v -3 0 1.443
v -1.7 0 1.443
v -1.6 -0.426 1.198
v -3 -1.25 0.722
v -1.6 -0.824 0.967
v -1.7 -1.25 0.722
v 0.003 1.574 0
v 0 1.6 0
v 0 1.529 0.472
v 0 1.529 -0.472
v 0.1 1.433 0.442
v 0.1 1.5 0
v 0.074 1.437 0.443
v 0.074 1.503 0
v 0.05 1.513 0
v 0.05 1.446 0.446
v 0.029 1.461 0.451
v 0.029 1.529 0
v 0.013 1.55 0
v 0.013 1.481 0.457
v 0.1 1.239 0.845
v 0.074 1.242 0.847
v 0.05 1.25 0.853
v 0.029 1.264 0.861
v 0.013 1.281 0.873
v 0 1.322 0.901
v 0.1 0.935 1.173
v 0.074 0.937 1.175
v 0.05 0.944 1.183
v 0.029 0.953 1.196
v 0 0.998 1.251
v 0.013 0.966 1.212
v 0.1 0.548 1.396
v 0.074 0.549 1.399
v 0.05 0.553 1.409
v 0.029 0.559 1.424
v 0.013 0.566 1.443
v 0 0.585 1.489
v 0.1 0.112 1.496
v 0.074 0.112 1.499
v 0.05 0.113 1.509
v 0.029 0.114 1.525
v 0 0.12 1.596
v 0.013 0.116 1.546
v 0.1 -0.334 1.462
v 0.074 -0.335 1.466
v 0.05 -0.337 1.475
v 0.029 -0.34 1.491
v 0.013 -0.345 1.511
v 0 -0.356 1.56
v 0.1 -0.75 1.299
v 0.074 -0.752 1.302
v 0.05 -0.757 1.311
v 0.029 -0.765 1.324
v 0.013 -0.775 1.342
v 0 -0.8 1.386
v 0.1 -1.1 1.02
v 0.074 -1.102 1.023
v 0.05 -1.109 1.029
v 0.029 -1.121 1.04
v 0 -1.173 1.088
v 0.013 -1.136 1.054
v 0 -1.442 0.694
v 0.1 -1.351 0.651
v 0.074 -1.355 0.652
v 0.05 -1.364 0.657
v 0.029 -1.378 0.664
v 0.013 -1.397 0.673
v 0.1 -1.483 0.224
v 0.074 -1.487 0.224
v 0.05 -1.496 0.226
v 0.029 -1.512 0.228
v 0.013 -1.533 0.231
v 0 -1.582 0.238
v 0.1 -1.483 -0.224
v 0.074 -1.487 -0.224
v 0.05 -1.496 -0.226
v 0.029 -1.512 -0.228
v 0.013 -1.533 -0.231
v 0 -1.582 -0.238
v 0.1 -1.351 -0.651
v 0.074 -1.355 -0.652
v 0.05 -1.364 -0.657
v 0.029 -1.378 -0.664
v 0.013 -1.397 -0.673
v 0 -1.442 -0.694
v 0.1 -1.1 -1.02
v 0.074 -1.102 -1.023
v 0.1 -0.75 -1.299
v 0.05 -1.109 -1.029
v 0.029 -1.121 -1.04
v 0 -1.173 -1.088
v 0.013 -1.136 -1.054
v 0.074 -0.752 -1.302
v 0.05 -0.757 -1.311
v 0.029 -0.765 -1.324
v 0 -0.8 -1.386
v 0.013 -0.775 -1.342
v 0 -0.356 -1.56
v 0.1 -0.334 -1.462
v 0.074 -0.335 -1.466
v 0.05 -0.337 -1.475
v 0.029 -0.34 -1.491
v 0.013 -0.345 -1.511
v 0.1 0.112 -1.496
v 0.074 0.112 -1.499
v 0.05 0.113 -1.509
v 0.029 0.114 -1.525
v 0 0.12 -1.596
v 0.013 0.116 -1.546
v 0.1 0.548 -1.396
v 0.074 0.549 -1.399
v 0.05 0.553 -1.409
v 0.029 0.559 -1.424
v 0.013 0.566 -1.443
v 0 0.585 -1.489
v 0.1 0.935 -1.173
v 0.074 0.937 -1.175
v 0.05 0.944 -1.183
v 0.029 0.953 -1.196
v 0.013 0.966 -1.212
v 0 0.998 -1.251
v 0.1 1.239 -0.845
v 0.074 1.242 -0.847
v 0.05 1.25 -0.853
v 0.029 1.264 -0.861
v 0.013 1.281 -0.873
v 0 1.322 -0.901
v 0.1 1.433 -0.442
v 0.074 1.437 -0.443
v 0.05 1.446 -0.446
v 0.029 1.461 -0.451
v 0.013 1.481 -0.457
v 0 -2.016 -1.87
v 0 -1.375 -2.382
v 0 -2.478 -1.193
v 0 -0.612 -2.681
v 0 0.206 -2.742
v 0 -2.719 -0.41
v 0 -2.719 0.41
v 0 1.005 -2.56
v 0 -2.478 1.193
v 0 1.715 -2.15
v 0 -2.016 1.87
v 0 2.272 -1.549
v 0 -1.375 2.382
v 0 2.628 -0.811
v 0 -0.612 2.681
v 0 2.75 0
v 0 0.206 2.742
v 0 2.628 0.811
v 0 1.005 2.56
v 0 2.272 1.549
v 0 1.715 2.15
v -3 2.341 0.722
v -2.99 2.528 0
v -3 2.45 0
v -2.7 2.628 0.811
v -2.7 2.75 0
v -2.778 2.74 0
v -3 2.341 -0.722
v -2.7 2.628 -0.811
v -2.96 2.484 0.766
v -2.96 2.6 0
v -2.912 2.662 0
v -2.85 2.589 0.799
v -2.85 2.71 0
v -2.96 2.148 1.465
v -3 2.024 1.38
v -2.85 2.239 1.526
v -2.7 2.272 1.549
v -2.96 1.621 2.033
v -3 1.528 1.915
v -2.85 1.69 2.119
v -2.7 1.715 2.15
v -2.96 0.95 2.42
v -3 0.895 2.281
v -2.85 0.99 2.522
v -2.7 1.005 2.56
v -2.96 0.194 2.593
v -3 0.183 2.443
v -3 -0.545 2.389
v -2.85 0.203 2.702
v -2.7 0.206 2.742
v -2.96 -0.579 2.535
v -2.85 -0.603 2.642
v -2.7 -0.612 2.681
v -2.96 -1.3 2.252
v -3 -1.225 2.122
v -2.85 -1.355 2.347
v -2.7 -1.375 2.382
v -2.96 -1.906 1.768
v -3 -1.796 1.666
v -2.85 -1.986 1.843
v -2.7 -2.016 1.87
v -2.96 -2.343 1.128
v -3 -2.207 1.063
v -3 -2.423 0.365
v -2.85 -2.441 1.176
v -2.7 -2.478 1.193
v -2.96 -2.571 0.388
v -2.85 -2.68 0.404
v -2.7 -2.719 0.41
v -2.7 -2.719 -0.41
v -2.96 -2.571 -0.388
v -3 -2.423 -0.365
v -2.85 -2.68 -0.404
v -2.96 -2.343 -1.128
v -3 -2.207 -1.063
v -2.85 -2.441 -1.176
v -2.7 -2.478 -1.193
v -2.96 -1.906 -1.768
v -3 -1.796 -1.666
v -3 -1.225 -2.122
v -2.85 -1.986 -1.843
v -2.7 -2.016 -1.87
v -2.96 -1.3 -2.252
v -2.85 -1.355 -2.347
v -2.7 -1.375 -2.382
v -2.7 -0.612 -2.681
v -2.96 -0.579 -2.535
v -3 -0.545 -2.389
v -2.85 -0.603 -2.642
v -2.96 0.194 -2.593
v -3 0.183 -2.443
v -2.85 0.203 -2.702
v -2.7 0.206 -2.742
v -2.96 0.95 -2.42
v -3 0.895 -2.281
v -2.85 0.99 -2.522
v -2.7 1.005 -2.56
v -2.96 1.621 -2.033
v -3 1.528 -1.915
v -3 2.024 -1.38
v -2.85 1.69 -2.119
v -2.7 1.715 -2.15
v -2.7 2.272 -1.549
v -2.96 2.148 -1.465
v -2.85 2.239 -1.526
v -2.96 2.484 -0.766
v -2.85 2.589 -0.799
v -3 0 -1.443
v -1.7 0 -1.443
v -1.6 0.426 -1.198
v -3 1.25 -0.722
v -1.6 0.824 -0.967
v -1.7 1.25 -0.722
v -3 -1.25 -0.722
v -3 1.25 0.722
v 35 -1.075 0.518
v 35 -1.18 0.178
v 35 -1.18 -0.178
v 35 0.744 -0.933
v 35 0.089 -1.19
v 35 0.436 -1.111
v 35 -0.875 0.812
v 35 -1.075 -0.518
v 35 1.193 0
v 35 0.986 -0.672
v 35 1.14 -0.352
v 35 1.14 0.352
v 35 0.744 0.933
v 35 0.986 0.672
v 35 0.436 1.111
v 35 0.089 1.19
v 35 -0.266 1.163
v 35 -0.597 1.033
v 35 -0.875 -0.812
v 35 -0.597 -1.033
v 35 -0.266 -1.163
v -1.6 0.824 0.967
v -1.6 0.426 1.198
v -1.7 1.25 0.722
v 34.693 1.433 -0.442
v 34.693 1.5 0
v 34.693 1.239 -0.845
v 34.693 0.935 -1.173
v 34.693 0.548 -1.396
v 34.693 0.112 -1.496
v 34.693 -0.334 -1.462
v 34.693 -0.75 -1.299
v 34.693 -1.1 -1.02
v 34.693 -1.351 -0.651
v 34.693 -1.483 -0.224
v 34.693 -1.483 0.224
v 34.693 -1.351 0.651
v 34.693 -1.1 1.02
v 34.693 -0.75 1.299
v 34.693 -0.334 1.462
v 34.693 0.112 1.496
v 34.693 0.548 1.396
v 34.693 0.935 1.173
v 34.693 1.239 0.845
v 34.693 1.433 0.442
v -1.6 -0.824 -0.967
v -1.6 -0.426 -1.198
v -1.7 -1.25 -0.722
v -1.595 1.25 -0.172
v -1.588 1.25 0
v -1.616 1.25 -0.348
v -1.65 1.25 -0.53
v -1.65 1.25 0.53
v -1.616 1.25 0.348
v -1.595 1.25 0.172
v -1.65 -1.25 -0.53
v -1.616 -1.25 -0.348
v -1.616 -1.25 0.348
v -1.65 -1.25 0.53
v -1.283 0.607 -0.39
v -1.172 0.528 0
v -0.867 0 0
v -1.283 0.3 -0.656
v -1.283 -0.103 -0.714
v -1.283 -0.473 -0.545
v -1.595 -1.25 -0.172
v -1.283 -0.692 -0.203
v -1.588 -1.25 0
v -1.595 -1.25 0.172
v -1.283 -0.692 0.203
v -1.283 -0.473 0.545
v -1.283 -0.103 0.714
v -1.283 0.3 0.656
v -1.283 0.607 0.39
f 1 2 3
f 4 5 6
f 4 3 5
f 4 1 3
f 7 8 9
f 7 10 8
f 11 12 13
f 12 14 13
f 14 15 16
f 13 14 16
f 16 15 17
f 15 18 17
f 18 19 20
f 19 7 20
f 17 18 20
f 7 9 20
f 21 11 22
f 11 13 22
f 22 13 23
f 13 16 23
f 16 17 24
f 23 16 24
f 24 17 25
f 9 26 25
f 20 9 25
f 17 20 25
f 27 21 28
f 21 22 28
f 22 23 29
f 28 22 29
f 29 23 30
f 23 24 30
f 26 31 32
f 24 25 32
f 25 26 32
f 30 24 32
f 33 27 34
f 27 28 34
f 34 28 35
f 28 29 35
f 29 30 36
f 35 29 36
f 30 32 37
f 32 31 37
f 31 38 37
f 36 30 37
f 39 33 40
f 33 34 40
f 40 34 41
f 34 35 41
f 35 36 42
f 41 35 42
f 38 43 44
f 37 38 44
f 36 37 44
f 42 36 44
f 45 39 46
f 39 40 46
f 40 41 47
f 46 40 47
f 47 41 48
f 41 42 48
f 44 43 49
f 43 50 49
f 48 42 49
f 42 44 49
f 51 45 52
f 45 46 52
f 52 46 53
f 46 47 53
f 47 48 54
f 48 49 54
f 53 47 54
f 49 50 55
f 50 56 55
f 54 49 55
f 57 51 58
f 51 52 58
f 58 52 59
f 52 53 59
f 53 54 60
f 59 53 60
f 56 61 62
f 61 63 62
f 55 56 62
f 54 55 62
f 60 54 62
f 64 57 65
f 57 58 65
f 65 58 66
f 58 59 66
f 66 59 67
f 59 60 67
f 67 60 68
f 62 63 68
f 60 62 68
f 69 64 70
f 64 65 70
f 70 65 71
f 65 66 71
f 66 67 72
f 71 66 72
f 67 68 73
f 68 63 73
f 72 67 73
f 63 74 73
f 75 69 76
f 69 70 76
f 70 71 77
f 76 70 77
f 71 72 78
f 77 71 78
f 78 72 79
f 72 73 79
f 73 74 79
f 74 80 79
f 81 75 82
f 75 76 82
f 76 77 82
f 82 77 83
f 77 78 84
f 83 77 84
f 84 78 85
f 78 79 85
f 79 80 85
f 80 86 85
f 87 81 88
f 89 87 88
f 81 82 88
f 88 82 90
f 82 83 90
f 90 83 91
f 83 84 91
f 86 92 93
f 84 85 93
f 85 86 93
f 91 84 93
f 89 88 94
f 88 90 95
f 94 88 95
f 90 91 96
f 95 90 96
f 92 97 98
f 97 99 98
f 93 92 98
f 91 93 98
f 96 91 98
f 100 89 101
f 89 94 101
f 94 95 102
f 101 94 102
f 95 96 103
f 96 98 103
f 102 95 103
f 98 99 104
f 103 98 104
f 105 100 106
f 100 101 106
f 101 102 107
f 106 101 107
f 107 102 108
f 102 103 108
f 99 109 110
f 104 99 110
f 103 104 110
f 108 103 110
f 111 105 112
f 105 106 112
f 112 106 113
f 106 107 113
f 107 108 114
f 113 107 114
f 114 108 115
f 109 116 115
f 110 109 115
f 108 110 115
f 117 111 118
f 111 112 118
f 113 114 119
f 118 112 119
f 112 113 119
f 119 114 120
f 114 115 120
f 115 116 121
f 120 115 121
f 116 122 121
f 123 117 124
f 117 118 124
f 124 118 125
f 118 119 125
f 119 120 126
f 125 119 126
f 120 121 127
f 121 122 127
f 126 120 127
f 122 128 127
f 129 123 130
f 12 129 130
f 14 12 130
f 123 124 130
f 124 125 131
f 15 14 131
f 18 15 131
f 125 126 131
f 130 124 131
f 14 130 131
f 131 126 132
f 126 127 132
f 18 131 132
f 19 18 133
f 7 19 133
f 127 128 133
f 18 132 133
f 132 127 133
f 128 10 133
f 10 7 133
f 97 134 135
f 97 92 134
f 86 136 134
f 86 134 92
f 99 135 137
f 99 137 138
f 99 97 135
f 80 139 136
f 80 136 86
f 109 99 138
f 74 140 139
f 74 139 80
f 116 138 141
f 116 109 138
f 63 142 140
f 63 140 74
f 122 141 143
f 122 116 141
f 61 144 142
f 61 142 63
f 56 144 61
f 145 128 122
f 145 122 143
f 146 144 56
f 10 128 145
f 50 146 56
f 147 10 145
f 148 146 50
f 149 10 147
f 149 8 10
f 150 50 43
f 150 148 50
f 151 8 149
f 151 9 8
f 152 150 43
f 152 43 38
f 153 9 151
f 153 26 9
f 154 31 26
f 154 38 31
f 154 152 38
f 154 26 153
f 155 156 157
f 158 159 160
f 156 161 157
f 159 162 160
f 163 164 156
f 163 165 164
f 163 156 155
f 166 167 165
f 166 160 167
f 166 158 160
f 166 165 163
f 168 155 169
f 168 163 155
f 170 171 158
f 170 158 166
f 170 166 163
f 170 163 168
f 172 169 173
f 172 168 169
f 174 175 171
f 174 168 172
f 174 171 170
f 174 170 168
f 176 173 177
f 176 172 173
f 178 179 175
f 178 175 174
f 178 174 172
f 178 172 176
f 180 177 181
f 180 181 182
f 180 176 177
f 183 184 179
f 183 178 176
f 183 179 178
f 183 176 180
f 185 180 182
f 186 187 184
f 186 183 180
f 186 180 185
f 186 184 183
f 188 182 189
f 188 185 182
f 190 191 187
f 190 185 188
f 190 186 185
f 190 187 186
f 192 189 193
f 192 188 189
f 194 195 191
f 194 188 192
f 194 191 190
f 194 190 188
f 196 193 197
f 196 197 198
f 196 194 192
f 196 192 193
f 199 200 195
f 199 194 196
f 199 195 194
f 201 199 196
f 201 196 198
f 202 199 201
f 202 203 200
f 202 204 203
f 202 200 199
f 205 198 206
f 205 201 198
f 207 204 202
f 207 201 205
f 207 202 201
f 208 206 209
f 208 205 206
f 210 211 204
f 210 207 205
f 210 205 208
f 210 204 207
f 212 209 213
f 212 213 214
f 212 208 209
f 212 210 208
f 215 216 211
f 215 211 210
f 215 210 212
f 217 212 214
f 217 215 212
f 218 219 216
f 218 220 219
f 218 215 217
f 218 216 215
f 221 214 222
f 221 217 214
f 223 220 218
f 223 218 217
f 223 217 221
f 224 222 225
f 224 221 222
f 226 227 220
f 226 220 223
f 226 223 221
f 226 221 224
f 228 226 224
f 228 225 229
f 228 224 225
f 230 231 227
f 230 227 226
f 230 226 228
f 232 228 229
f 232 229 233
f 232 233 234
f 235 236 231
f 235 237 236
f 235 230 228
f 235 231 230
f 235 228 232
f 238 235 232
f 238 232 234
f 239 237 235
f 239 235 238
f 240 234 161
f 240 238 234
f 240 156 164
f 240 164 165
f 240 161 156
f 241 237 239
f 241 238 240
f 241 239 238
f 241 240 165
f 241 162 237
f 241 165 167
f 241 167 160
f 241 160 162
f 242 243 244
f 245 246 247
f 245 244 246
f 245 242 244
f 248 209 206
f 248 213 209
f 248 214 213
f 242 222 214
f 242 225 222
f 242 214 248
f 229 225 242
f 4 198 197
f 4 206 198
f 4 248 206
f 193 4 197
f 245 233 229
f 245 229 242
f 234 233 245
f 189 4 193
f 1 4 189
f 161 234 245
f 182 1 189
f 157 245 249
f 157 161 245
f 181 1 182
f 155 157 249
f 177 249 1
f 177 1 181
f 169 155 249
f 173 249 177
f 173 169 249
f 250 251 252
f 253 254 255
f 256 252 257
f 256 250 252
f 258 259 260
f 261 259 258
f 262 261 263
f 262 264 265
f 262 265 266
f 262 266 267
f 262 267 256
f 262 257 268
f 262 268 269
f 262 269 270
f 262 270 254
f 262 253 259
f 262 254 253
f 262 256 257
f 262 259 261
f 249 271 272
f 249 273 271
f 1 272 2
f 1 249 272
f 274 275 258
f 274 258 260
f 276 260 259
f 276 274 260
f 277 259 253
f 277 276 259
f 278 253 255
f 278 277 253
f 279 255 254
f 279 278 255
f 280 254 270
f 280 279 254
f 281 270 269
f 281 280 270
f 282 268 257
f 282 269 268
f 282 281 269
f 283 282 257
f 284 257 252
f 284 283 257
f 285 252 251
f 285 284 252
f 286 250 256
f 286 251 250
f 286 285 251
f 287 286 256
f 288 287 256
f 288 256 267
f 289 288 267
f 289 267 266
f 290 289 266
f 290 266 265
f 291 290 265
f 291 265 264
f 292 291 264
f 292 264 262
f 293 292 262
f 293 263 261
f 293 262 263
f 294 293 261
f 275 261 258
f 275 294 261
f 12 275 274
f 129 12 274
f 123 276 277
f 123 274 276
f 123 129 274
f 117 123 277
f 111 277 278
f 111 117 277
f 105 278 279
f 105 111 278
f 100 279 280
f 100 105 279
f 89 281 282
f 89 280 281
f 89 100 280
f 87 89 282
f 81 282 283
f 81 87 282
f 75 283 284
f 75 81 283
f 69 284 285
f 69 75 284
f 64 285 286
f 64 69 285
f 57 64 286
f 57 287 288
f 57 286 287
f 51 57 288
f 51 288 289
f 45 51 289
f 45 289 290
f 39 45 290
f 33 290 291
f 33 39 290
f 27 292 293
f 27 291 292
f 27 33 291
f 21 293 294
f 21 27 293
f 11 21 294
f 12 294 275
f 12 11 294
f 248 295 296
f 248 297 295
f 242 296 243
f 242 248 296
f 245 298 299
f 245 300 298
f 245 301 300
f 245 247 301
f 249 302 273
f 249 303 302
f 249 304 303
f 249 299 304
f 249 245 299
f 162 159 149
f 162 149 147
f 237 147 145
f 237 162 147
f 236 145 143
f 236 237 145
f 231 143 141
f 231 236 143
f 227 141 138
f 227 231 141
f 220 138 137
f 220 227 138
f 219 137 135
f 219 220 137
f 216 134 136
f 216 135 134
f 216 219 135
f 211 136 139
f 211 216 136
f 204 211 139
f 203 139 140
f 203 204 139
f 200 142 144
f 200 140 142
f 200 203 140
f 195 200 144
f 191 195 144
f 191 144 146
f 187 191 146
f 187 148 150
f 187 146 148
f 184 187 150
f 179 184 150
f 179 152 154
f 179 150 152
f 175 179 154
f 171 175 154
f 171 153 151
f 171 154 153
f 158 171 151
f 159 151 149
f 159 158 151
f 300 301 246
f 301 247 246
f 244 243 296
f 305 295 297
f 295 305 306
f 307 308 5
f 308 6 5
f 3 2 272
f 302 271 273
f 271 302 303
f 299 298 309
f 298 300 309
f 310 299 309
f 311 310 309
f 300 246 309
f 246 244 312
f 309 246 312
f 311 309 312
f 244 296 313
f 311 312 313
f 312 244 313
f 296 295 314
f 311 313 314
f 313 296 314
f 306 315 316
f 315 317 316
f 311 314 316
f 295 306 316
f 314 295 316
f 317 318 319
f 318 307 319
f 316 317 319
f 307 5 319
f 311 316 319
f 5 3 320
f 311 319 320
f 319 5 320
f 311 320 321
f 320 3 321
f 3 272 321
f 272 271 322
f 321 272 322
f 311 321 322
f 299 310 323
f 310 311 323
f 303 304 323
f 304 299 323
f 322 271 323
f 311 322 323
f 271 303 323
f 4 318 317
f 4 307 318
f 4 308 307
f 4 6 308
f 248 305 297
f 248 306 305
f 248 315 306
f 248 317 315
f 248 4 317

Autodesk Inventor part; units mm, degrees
ref_plane "YZ Plane" through (0, 0, 0) normal (1, 0, 0) x (0, 1, 0)
ref_plane "XZ Plane" through (0, 0, 0) normal (0, 1, 0) x (-1, 0, 0)
sketch "Sketch1" plane through (0, 0, 0) normal (0, 0, 1) x (1, 0, 0)
  line L0 (-0.8667, 0) -> (35, 0)
  line L1 (35, 0) -> (35, 1.5)
  line L2 (35, 1.5) -> (28.25, 1.5)
  line L3 (28.25, 1.5) -> (27.9432, 1.5)
  line L4 (27.9432, 1.5) -> (0, 1.5)
  line L5 (0, 1.5) -> (0, 2.75)
  line L6 (0, 2.75) -> (-3, 2.75)
  line L7 (-3, 2.75) -> (-3, 1.4434)
  line L8 (-3, 1.4434) -> (-1.7, 1.4434)
  line L9 (-1.7, 1.4434) -> (-0.8667, 0)
  line L10 (-10.6, 0) -> (42.6, 0) projected
  line L11 (0, -0.55) -> (0, 3.3) projected
  line L12 (28.25, 1.5) -> (0, 1.5) construction
  dimension "d1" = 6.75
  dimension "d2" = 0.3068
  dimension "d3" = 3
  dimension "d4" = 1.3
  dimension "d5" = 60
  dimension "d6" = 3
  dimension "d7" = 3
  dimension "d8" = 2.8868
  dimension "d9" = 5.5
  dimension "d26" = 35
revolve "Body" add sketch "Sketch1" angle 360 about axis through (-0.8667, 0, 0) along (1, 0, 0)
sketch "Sketch2" plane through (-3, 0, 0) normal (-1, 0, 0) x (0, 0, 1)
  circle A0 centre (0, 0) radius 1.4434 projected
  line L0 (0, -3.85) -> (0, 3.85) projected
  line L1 (-3.85, 0) -> (3.85, 0) projected
  line L2 (1.4434, 0) -> (0.7217, -1.25)
  line L3 (0.7217, -1.25) -> (-0.7217, -1.25)
  line L4 (-0.7217, -1.25) -> (-1.4434, 0)
  line L5 (-1.4434, 0) -> (-0.7217, 1.25)
  line L6 (-0.7217, 1.25) -> (0.7217, 1.25)
  line L7 (0.7217, 1.25) -> (1.4434, 0)
extrude "Slot" add sketch "Sketch2" against normal up to next contours L7 A0 | A0 L2 | L6 L0 A0 | A0 L0 L3 | L0 L6 A0 | A0 L3 L0 | L4 A0 | A0 L5
fillet "Fillet1" radius 0.3 1 edges at (-3, -2.75, 0)
thread "Thread" size "M3x0.5" class "6g" standard "ISO Metric profile" length 6.75
chamfer "Chamfer1" distance 0.3067 distance2 0.3067 1 edges at (35, -1.5, 0) measured on face at (35, -0.8773, -0.3972)
ref_plane "Work Plane1" through (29, 0, 0) normal (0, -1, 0) x (1, 0, 0)
fillet "Fillet2" radius 0.1 1 edges at (0, -1.5, 0)
equation "\"d1\" = GEL"
equation "\"d3\" = KOH"
equation "\"d4\" = INTI"
equation "\"d6\" = GD"
equation "\"d7\" = BDM"
equation "\"d8\" = 1.1547 * SW"
equation "\"d9\" = KOD"
equation "\"d30\" = R"
equation "\"d17\" = RR"
equation "\"d13\" = GEL"
equation "\"d15\" = -0.5 * SPD + 0.5 * GD"
equation "\"d16\" = GUL"
equation "\"GD\" = NND"
equation "\"NLG\" = 8"
equation "\"GEL\" = 6.75"
equation "\"KOD\" = 5.5"
equation "\"KOH\" = NND"
equation "\"INTI\" = 1.3"
equation "\"GAL\" = 0.61345 * PTC"
equation "\"GUL\" = 0.61345 * PTC"
equation "\"BDM\" = NND"
equation "\"SW\" = 2.5"
equation "\"RR\" = 0.1 * NND"
equation "\"SPD\" = NND - 1.2269 * PTC"
equation "\"R\" = 0.1"
equation "\"PHH\" = 0.13"
equation "\"GD1\" = THREADDIA - 1.2269 * PTC"
equation "\"THREADDIA\" = 3"
equation "\"FAWI\" = 45deg"
equation "\"PTC\" = 0.5"
equation "\"KOH1\" = 2.7"
equation "\"NND\" = 3"
equation "\"TOA\" = 30deg"
equation "\"E0\" = 1.155 * SW"
properties part number "AS 1420 - 1973 - M3 x 8" material "Steel, Mild"
